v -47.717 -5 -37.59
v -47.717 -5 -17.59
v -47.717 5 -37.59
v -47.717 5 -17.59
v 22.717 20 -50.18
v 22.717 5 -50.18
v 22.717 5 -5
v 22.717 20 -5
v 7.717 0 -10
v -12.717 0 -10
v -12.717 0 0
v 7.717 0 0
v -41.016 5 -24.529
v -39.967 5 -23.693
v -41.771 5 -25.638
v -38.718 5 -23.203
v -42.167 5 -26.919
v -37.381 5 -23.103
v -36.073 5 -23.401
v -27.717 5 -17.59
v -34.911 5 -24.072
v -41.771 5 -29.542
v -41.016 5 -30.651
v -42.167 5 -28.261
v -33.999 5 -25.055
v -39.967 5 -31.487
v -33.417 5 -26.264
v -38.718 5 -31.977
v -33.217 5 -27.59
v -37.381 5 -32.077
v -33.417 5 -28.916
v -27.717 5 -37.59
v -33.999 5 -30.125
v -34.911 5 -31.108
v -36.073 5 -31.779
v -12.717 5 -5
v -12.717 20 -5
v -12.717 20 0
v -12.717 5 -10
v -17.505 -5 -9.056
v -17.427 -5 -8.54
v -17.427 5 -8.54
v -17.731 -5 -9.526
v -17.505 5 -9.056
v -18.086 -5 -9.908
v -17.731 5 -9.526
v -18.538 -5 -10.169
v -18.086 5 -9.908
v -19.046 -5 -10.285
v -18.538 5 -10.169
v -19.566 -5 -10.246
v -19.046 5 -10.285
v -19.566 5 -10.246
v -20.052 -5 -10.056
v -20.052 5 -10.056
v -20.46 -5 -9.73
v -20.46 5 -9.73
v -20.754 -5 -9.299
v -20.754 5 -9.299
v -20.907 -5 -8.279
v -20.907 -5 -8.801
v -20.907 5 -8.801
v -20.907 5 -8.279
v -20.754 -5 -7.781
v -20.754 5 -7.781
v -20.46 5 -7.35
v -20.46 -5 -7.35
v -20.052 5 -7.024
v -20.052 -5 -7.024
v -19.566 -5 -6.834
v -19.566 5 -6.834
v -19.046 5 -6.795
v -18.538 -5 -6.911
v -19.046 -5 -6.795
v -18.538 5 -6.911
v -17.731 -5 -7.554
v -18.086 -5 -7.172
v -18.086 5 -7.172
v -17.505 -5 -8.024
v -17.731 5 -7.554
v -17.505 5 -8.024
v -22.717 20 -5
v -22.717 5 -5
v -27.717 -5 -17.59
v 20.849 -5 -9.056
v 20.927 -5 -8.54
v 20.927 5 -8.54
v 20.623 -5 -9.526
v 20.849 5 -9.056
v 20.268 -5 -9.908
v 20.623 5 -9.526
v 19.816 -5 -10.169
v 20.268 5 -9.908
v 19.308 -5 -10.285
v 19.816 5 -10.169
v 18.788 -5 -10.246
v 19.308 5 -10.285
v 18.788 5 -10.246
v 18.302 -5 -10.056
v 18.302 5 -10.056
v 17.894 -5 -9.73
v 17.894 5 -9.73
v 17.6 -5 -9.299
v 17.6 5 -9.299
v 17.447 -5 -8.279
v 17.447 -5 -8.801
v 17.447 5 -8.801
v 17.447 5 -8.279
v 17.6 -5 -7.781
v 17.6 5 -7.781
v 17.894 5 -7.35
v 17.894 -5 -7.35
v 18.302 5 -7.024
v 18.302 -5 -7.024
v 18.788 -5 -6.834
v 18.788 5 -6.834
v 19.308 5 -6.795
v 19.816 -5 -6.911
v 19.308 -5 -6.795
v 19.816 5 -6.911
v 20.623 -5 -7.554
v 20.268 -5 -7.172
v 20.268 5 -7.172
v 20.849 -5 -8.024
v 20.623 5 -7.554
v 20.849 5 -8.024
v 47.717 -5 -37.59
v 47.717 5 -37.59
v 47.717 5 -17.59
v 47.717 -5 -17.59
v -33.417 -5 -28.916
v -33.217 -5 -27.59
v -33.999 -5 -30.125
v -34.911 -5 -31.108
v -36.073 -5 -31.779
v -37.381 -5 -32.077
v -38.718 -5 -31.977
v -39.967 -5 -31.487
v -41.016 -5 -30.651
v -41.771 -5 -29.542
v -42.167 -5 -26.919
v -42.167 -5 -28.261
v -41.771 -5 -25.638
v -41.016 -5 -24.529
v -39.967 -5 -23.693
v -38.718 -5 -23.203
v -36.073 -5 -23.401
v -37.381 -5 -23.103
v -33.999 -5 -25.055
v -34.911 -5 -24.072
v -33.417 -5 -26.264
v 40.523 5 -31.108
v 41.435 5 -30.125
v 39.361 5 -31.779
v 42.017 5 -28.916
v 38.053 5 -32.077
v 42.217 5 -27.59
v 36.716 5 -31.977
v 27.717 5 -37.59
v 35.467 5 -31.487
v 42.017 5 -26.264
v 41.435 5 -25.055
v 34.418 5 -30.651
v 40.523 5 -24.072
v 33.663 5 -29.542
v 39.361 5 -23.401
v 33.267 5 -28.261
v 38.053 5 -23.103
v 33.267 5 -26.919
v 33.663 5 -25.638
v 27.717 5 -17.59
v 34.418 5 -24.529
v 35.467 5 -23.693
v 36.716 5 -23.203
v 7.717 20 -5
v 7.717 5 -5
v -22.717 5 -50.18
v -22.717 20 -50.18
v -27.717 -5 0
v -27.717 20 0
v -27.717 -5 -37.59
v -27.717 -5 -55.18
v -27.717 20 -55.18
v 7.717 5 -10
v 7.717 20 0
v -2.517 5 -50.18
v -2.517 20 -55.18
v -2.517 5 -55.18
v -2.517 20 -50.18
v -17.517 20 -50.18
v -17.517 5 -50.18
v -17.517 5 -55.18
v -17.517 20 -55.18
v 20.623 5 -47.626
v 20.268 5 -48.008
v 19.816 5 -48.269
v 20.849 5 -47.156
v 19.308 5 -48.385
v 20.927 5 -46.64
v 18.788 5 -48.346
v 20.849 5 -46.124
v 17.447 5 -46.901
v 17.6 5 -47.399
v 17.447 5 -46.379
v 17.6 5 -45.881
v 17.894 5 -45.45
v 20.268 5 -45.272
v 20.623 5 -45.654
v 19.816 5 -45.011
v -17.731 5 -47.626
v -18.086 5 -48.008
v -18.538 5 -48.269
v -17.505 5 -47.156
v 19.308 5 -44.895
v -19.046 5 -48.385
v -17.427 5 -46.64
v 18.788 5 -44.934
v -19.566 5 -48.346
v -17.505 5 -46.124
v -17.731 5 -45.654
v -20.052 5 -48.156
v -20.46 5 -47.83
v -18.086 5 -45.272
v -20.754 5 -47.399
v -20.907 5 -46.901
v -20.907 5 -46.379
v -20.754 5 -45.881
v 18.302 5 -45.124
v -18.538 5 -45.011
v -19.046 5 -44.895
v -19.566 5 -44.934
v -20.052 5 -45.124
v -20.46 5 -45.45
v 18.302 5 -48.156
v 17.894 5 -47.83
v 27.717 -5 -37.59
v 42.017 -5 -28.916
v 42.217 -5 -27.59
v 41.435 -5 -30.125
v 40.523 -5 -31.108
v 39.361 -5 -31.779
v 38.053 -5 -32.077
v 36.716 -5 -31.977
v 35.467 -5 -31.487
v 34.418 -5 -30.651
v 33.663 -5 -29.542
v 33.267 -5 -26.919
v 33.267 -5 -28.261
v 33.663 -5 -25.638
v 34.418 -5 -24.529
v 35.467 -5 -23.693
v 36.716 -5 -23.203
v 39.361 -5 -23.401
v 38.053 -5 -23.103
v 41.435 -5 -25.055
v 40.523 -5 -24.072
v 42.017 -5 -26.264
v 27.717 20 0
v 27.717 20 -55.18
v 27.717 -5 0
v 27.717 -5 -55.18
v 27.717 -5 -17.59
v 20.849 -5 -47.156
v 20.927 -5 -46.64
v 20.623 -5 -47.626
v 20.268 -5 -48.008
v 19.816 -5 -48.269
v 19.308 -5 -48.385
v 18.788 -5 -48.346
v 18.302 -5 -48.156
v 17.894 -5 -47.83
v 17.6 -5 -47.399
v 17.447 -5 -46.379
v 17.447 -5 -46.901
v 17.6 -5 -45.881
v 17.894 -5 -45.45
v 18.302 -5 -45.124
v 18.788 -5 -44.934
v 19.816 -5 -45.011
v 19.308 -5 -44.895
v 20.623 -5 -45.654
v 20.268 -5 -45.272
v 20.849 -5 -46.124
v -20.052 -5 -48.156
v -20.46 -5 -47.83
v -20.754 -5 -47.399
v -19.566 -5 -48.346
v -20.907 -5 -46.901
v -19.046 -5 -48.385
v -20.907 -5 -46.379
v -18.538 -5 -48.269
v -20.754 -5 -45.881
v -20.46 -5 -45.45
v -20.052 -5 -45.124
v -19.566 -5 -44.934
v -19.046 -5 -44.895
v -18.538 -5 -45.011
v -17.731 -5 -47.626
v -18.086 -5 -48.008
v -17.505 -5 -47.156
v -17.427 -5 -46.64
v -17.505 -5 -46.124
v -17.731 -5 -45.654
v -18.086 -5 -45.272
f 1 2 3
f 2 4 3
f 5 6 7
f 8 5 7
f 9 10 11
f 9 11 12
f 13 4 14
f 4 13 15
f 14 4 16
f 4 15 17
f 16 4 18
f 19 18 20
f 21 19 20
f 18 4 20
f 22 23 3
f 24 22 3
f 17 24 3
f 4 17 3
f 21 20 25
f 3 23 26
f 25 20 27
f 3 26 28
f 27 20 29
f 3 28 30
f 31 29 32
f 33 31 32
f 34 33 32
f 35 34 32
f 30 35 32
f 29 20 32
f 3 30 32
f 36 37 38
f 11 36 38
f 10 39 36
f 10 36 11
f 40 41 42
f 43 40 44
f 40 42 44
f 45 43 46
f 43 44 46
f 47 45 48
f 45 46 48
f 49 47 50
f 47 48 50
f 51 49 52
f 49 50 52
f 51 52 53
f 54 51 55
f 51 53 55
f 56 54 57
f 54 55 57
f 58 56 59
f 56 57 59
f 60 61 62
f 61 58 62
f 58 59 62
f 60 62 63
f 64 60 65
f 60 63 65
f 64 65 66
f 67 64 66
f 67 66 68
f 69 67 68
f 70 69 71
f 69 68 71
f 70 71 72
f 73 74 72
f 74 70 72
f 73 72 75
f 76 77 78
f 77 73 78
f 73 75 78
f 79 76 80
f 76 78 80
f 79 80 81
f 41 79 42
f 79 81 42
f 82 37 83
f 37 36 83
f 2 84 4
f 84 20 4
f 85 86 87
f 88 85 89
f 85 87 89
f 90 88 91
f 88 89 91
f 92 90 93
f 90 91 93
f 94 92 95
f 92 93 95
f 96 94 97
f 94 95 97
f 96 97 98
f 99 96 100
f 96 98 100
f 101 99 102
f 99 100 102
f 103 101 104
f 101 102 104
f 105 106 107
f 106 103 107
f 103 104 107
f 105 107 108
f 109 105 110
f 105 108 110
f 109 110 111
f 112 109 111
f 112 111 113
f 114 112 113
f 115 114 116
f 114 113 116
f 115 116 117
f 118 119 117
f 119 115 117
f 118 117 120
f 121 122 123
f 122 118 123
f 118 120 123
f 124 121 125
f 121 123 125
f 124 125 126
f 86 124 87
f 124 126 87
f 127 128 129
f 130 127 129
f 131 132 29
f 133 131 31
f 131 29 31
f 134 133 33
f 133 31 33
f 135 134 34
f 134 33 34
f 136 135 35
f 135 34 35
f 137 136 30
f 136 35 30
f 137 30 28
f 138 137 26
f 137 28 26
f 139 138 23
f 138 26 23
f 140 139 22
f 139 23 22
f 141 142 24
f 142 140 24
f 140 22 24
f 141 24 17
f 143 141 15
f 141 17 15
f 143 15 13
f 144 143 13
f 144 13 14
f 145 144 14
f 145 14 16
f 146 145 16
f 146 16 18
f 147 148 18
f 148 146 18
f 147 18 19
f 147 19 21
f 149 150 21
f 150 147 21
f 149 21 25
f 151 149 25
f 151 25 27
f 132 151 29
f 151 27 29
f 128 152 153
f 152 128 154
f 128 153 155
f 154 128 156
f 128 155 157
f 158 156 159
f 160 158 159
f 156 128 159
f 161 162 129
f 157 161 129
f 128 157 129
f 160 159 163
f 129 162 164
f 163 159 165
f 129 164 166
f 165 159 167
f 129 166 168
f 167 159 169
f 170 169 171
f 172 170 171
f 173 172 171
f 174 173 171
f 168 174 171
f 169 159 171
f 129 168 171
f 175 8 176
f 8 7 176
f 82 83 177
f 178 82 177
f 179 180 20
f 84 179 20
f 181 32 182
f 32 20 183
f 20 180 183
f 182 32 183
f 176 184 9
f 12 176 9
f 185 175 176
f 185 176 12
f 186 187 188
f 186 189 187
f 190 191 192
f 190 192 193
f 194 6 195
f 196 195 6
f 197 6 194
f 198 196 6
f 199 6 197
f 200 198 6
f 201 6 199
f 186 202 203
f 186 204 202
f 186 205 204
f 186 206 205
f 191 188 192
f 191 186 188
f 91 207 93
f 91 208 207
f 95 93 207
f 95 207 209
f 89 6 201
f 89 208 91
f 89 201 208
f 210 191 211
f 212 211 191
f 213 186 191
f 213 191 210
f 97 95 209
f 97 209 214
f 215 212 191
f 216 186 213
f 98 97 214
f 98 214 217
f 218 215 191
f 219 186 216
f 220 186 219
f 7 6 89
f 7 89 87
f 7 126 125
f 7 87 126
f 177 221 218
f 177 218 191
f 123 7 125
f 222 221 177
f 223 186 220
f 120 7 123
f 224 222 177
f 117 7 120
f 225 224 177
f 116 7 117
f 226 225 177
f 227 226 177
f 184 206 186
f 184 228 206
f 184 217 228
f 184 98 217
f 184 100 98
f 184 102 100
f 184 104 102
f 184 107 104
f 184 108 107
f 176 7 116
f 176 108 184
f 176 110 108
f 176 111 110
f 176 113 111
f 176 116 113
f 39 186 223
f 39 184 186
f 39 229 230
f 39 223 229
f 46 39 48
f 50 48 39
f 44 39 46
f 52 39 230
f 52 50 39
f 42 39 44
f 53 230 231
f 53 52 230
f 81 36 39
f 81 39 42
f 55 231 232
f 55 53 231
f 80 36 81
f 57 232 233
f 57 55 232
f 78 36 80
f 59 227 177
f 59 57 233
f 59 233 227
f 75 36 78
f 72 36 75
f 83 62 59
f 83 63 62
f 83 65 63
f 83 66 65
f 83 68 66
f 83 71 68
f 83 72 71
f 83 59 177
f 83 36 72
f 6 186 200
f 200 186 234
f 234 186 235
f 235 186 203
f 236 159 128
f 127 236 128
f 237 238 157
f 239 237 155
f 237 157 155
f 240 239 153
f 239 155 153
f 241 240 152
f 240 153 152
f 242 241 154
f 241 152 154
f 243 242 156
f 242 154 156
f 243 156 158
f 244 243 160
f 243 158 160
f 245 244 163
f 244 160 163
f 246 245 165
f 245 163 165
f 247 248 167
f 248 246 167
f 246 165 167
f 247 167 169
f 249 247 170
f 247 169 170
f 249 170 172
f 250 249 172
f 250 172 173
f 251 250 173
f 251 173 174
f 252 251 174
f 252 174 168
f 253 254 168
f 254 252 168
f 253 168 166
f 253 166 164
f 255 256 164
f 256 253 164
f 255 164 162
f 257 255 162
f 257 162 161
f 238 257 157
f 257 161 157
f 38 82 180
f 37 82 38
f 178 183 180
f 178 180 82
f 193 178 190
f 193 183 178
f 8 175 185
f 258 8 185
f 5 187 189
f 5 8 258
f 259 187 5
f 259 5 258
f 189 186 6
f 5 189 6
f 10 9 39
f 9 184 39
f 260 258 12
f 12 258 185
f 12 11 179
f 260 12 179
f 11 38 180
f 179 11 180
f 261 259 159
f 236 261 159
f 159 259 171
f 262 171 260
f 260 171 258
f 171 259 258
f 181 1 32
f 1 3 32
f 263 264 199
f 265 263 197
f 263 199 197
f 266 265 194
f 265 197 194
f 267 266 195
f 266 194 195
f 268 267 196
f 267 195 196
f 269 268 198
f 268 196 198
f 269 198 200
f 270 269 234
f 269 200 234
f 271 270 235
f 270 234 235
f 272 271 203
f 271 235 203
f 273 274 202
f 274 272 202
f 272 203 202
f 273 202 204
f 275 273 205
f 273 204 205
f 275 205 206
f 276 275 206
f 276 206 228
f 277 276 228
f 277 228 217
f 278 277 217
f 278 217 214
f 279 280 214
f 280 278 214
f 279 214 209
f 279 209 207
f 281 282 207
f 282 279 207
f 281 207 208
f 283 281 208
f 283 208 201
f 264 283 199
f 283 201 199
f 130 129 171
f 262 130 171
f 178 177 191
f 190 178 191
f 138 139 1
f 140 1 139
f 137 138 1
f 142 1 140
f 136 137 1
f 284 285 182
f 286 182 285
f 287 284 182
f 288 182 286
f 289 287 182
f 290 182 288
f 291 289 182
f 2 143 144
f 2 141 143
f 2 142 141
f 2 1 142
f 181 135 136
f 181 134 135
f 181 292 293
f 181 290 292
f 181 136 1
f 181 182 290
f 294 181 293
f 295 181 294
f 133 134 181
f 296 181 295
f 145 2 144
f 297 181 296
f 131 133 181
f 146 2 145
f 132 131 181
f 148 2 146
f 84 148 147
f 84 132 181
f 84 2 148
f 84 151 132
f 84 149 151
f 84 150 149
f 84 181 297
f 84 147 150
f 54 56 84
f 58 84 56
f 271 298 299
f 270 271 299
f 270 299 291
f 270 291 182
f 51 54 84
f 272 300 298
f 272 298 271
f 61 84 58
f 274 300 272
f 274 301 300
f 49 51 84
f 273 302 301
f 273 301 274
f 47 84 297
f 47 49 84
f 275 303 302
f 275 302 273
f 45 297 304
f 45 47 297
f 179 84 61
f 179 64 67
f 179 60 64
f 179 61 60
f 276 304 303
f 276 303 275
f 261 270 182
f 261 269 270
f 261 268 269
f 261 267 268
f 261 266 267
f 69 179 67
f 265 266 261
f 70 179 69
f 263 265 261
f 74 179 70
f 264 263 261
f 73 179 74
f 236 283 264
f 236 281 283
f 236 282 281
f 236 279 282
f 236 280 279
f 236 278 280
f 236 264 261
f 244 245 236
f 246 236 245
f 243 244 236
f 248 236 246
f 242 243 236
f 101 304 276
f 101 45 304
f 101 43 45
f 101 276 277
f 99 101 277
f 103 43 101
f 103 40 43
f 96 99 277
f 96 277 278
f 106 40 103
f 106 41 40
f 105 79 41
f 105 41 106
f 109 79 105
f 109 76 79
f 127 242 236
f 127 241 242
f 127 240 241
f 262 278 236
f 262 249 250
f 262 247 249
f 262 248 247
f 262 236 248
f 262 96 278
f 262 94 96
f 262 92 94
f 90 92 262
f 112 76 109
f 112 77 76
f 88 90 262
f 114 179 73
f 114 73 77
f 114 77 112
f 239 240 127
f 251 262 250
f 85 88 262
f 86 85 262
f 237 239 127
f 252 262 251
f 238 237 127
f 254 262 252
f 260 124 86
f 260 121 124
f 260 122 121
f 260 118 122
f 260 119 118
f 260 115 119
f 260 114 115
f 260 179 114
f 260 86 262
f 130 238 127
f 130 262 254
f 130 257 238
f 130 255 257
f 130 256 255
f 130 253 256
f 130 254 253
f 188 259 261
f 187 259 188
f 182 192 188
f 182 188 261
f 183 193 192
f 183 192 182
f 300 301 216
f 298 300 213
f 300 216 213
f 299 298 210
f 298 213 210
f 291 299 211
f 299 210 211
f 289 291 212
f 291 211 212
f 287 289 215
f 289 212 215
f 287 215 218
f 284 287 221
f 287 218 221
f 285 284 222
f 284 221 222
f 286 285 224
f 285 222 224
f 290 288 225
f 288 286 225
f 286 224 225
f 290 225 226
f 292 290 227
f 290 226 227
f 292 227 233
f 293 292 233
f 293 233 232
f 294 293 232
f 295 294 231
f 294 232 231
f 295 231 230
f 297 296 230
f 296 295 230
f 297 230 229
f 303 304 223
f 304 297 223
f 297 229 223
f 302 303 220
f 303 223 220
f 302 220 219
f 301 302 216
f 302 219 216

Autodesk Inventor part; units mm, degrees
ref_plane "YZ Plane" through (0, 0, 0) normal (1, 0, 0) x (0, 1, 0)
ref_plane "XZ Plane" through (0, 0, 0) normal (0, 1, 0) x (-1, 0, 0)
ref_plane "XY Plane" through (0, 0, 0) normal (0, 0, 1) x (1, 0, 0)
sketch "스케치1" plane through (0, 0, 0) normal (0, 1, 0) x (-1, 0, 0)
  line L0 (27.717, -55.18) -> (-27.717, -55.18)
  line L1 (-27.717, -55.18) -> (-27.717, 0)
  line L2 (-27.717, 0) -> (27.717, 0)
  line L3 (27.717, 0) -> (27.717, -55.18)
  point P0 (0, 0)
  point P1 (0, 0)
  dimension "d0" = 55.434
  dimension "d1" = 55.18
extrude "돌출1" add sketch "스케치1" along normal blind 5
sketch "스케치2" plane through (0, 5, 0) normal (0, 1, 0) x (1, 0, 0)
  line L0 (-27.717, 0) -> (27.717, 0) projected
  line L1 (27.717, 0) -> (27.717, 55.18) projected
  line L2 (27.717, 55.18) -> (-27.717, 55.18) projected
  line L3 (-27.717, 55.18) -> (-27.717, 0) projected
  line L4 (-22.717, 50.18) -> (22.717, 50.18)
  line L5 (22.717, 50.18) -> (22.717, 5)
  line L6 (22.717, 5) -> (-22.717, 5)
  line L7 (-22.717, 5) -> (-22.717, 50.18)
  point P0 (0, 0)
  dimension "d4" = 45.434
  dimension "d5" = 45.18
  dimension "d6" = 5
  dimension "d7" = 5
extrude "돌출2" add sketch "스케치2" along normal blind 15
sketch "스케치3" plane through (22.717, 5, -5) normal (0, 0, -1) x (-1, 0, 0)
  line L0 (45.434, 0) -> (0, 0) projected
  line L1 (45.434, 0) -> (45.434, 15) projected
  line L2 (0, 15) -> (45.434, 15) projected
  line L3 (0, 0) -> (0, 15) projected
  line L4 (15, 15) -> (35.434, 15)
  line L5 (35.434, 15) -> (35.434, 0)
  line L6 (35.434, 0) -> (15, 0)
  line L7 (15, 0) -> (15, 15)
  point P0 (22.717, -5)
  point P1 (15, 0)
  dimension "d10" = 15
  dimension "d11" = 10
extrude "돌출3" cut sketch "스케치3" against normal blind 15 contours L0 L7 L2 L5
sketch "스케치5" plane through (-22.717, 5, -50.18) normal (0, 0, 1) x (1, 0, 0)
  line L0 (45.434, 0) -> (0, 0) projected
  line L1 (45.434, 0) -> (45.434, 15) projected
  line L2 (0, 15) -> (45.434, 15) projected
  line L3 (0, 0) -> (0, 15) projected
  line L4 (5.2, 15) -> (20.2, 15)
  line L5 (20.2, 15) -> (20.2, 0)
  line L6 (20.2, 0) -> (5.2, 0)
  line L7 (5.2, 0) -> (5.2, 15)
  point P0 (22.717, -5)
  point P1 (5.2, 0)
  dimension "d14" = 15
  dimension "d15" = 5.2
extrude "돌출4" cut sketch "스케치5" against normal blind 10 contours L0 L7 L2 L5
sketch "스케치6" plane through (0, 5, 0) normal (0, 1, 0) x (1, 0, 0)
  line L0 (-22.717, 50.18) -> (-22.717, 5) projected
  line L1 (-22.717, 5) -> (-12.717, 5) projected
  line L2 (-12.717, 5) -> (-12.717, 0) projected
  line L3 (7.717, 0) -> (-12.717, 0) projected
  line L4 (7.717, 5) -> (7.717, 0) projected
  line L5 (7.717, 5) -> (22.717, 5) projected
  line L6 (22.717, 5) -> (22.717, 50.18) projected
  line L7 (22.717, 50.18) -> (-2.517, 50.18) projected
  line L8 (-2.517, 50.18) -> (-2.517, 55.18) projected
  line L9 (-17.517, 55.18) -> (-2.517, 55.18) projected
  line L10 (-17.517, 50.18) -> (-17.517, 55.18) projected
  line L11 (-17.517, 50.18) -> (-22.717, 50.18) projected
  circle A0 centre (-19.177, 46.64) radius 1.75
  circle A1 centre (19.177, 46.64) radius 1.75
  circle A2 centre (-19.177, 8.54) radius 1.75
  circle A3 centre (19.177, 8.54) radius 1.75
  point P0 (0, 0)
  dimension "d18" = 3.5
  dimension "d19" = 3.5
  dimension "d20" = 3.5
  dimension "d21" = 3.5
  dimension "d22" = 3.54
  dimension "d23" = 3.54
  dimension "d24" = 38.354
  dimension "d25" = 38.1
  dimension "d26" = 38.354
  dimension "d27" = 38.1
  dimension "d28" = 3.54
  dimension "d29" = 3.54
  dimension "d30" = 3.54
  dimension "d31" = 3.54
  dimension "d32" = 3.54
  dimension "d33" = 3.54
extrude "돌출5" cut sketch "스케치6" against normal blind 10 contours A0 | A1 | A2 | A3
sketch "스케치7" plane through (27.717, 0, 0) normal (1, 0, 0) x (0, 0, -1)
  line L0 (17.59, 0) -> (37.59, 0)
  line L1 (37.59, 0) -> (37.59, 5)
  line L2 (37.59, 5) -> (17.59, 5)
  line L3 (17.59, 5) -> (17.59, 0)
  line L4 (55.18, 0) -> (55.18, 20) projected
  line L5 (0, 0) -> (0, 20) projected
  dimension "d36" = 20
  dimension "d37" = 5
  dimension "d38" = 55.18
  dimension "d39" = 17.59
  dimension "d40" = 15
extrude "돌출6" add sketch "스케치7" along normal blind 20
sketch "스케치8" plane through (27.717, 5, -17.59) normal (0, 1, 0) x (1, 0, 0)
  line L0 (0, 0) -> (0, 20) projected
  line L1 (0, 0) -> (20, 0) projected
  line L2 (20, 20) -> (20, 0) projected
  line L3 (0, 20) -> (20, 20) projected
  circle A0 centre (10, 10) radius 4.5
  point P0 (-27.717, -17.59)
  dimension "d43" = 9
extrude "돌출7" cut sketch "스케치8" against normal blind 20 contours A0
sketch "스케치9" plane through (-27.717, 0, -55.18) normal (-1, 0, 0) x (0, 0, 1)
  line L0 (17.59, 0) -> (37.59, 0)
  line L1 (37.59, 0) -> (37.59, 5)
  line L2 (37.59, 5) -> (17.59, 5)
  line L3 (17.59, 5) -> (17.59, 0)
  line L4 (55.18, 0) -> (55.18, 20) projected
  dimension "d46" = 20
  dimension "d47" = 5
  dimension "d48" = 17.59
  dimension "d49" = 15
extrude "돌출8" add sketch "스케치9" along normal blind 20
sketch "스케치10" plane through (-27.717, 5, -17.59) normal (0, 1, 0) x (1, 0, 0)
  line L0 (0, 20) -> (0, 0) projected
  line L1 (0, 20) -> (-20, 20) projected
  line L2 (-20, 0) -> (-20, 20) projected
  line L3 (0, 0) -> (-20, 0) projected
  circle A0 centre (-10, 10) radius 4.5
  point P0 (27.717, -17.59)
  dimension "d52" = 9
extrude "돌출9" cut sketch "스케치10" against normal blind 20 contours A0
sketch "스케치12" plane through (0, 0, 0) normal (0, -1, 0) x (1, 0, 0)
  circle A0 centre (-37.717, -27.59) radius 4.5 projected
  circle A1 centre (37.717, -27.59) radius 4.5 projected
  circle A2 centre (-19.177, -8.54) radius 1.75 projected
  circle A3 centre (19.177, -46.64) radius 1.75 projected
  circle A4 centre (19.177, -8.54) radius 1.75 projected
  circle A5 centre (-19.177, -46.64) radius 1.75 projected
  line L0 (-27.717, 0) -> (27.717, 0) projected
  line L1 (-27.717, -17.59) -> (-27.717, 0) projected
  line L2 (-27.717, -17.59) -> (-47.717, -17.59) projected
  line L3 (-47.717, -37.59) -> (-47.717, -17.59) projected
  line L4 (-27.717, -37.59) -> (-47.717, -37.59) projected
  line L5 (-27.717, -55.18) -> (-27.717, -37.59) projected
  line L6 (27.717, -55.18) -> (-27.717, -55.18) projected
  line L7 (27.717, -37.59) -> (27.717, -55.18) projected
  line L8 (27.717, -37.59) -> (47.717, -37.59) projected
  line L9 (47.717, -17.59) -> (47.717, -37.59) projected
  line L10 (27.717, -17.59) -> (47.717, -17.59) projected
  line L11 (27.717, 0) -> (27.717, -17.59) projected
  line L12 (-27.717, 0) -> (27.717, 0)
  line L13 (27.717, -55.18) -> (-27.717, -55.18)
  line L14 (27.717, -17.59) -> (47.717, -17.59)
  line L15 (47.717, -17.59) -> (47.717, -37.59)
  line L16 (47.717, -37.59) -> (27.717, -37.59)
  line L17 (-47.717, -17.59) -> (-27.717, -17.59)
  line L18 (-27.717, -37.59) -> (-47.717, -37.59)
  line L19 (-47.717, -37.59) -> (-47.717, -17.59)
  circle A6 centre (-37.717, -27.59) radius 4.5
  circle A7 centre (-19.177, -8.54) radius 1.75
  circle A8 centre (19.177, -8.54) radius 1.75
  circle A9 centre (37.717, -27.59) radius 4.5
  circle A10 centre (19.177, -46.64) radius 1.75
  circle A11 centre (-19.177, -46.64) radius 1.75
  line L20 (-27.717, -55.18) -> (-27.717, -37.59)
  line L21 (-27.717, -17.59) -> (-27.717, 0)
  line L22 (27.717, 0) -> (27.717, -17.59)
  line L23 (27.717, -37.59) -> (27.717, -55.18)
  point P0 (0, 0)
extrude "돌출10" add sketch "스케치12" along normal blind 2
sketch "스케치13" plane through (0, 5, 0) normal (0, 1, 0) x (1, 0, 0)
  circle A0 centre (-19.177, 8.54) radius 1.75 projected
  circle A1 centre (19.177, 46.64) radius 1.75 projected
  circle A2 centre (19.177, 8.54) radius 1.75 projected
  circle A3 centre (-19.177, 46.64) radius 1.75 projected
  line L0 (-22.717, 50.18) -> (-22.717, 5) projected
  line L1 (-22.717, 5) -> (-12.717, 5) projected
  line L2 (-12.717, 5) -> (-12.717, 0) projected
  line L3 (7.717, 0) -> (-12.717, 0) projected
  line L4 (7.717, 5) -> (7.717, 0) projected
  line L5 (7.717, 5) -> (22.717, 5) projected
  line L6 (22.717, 5) -> (22.717, 50.18) projected
  line L7 (22.717, 50.18) -> (-2.517, 50.18) projected
  line L8 (-2.517, 50.18) -> (-2.517, 55.18) projected
  line L9 (-17.517, 55.18) -> (-2.517, 55.18) projected
  line L10 (-17.517, 50.18) -> (-17.517, 55.18) projected
  line L11 (-17.517, 50.18) -> (-22.717, 50.18) projected
  line L12 (-12.717, 0) -> (7.717, 0)
  line L13 (7.717, 0) -> (7.717, 5)
  line L14 (-12.717, 5) -> (-12.717, 0)
  line L15 (7.717, 5) -> (7.717, 10)
  line L16 (7.717, 10) -> (-12.717, 10)
  line L17 (-12.717, 10) -> (-12.717, 5)
  point P0 (0, 0)
  dimension "d57" = 5
extrude "돌출11" cut sketch "스케치13" against normal blind 5 contours L17 L16 L15 L4 L3 L2
sketch "스케치14" plane through (0, -2, 0) normal (0, -1, 0) x (1, 0, 0)
  line L0 (27.717, 0) -> (-27.717, 0) projected
  line L1 (-27.717, 0) -> (-27.717, -17.59) projected
  line L2 (-27.717, -17.59) -> (-47.717, -17.59) projected
  line L3 (-47.717, -17.59) -> (-47.717, -37.59) projected
  line L4 (-47.717, -37.59) -> (-27.717, -37.59) projected
  line L5 (-27.717, -37.59) -> (-27.717, -55.18) projected
  line L6 (-27.717, -55.18) -> (27.717, -55.18) projected
  line L7 (27.717, -55.18) -> (27.717, -37.59) projected
  line L8 (27.717, -37.59) -> (47.717, -37.59) projected
  line L9 (47.717, -37.59) -> (47.717, -17.59) projected
  line L10 (47.717, -17.59) -> (27.717, -17.59) projected
  line L11 (27.717, -17.59) -> (27.717, 0) projected
  circle A0 centre (-37.717, -27.59) radius 4.5 projected
  circle A1 centre (37.717, -27.59) radius 4.5 projected
  circle A2 centre (-19.177, -8.54) radius 1.75 projected
  circle A3 centre (19.177, -46.64) radius 1.75 projected
  circle A4 centre (19.177, -8.54) radius 1.75 projected
  circle A5 centre (-19.177, -46.64) radius 1.75 projected
  line L12 (47.717, -17.59) -> (47.717, -37.59)
  line L13 (-47.717, -37.59) -> (-47.717, -17.59)
  line L14 (-27.717, 0) -> (27.717, 0)
  line L15 (27.717, -55.18) -> (-27.717, -55.18)
  circle A6 centre (-19.177, -8.54) radius 1.75
  circle A7 centre (19.177, -8.54) radius 1.75
  circle A8 centre (19.177, -46.64) radius 1.75
  circle A9 centre (-19.177, -46.64) radius 1.75
  circle A10 centre (-37.717, -27.59) radius 4.5
  circle A11 centre (37.717, -27.59) radius 4.5
  line L16 (-47.717, -17.59) -> (-27.717, -17.59)
  line L17 (27.717, -17.59) -> (47.717, -17.59)
  line L18 (47.717, -37.59) -> (27.717, -37.59)
  line L19 (-27.717, -37.59) -> (-47.717, -37.59)
  line L20 (27.717, 0) -> (27.717, -17.59)
  line L21 (27.717, -37.59) -> (27.717, -55.18)
  line L22 (-27.717, -55.18) -> (-27.717, -37.59)
  line L23 (-27.717, -17.59) -> (-27.717, 0)
  point P0 (0, 0)
extrude "돌출12" add sketch "스케치14" along normal blind 3
properties part number "ZED-F9P-02B-case_new"
